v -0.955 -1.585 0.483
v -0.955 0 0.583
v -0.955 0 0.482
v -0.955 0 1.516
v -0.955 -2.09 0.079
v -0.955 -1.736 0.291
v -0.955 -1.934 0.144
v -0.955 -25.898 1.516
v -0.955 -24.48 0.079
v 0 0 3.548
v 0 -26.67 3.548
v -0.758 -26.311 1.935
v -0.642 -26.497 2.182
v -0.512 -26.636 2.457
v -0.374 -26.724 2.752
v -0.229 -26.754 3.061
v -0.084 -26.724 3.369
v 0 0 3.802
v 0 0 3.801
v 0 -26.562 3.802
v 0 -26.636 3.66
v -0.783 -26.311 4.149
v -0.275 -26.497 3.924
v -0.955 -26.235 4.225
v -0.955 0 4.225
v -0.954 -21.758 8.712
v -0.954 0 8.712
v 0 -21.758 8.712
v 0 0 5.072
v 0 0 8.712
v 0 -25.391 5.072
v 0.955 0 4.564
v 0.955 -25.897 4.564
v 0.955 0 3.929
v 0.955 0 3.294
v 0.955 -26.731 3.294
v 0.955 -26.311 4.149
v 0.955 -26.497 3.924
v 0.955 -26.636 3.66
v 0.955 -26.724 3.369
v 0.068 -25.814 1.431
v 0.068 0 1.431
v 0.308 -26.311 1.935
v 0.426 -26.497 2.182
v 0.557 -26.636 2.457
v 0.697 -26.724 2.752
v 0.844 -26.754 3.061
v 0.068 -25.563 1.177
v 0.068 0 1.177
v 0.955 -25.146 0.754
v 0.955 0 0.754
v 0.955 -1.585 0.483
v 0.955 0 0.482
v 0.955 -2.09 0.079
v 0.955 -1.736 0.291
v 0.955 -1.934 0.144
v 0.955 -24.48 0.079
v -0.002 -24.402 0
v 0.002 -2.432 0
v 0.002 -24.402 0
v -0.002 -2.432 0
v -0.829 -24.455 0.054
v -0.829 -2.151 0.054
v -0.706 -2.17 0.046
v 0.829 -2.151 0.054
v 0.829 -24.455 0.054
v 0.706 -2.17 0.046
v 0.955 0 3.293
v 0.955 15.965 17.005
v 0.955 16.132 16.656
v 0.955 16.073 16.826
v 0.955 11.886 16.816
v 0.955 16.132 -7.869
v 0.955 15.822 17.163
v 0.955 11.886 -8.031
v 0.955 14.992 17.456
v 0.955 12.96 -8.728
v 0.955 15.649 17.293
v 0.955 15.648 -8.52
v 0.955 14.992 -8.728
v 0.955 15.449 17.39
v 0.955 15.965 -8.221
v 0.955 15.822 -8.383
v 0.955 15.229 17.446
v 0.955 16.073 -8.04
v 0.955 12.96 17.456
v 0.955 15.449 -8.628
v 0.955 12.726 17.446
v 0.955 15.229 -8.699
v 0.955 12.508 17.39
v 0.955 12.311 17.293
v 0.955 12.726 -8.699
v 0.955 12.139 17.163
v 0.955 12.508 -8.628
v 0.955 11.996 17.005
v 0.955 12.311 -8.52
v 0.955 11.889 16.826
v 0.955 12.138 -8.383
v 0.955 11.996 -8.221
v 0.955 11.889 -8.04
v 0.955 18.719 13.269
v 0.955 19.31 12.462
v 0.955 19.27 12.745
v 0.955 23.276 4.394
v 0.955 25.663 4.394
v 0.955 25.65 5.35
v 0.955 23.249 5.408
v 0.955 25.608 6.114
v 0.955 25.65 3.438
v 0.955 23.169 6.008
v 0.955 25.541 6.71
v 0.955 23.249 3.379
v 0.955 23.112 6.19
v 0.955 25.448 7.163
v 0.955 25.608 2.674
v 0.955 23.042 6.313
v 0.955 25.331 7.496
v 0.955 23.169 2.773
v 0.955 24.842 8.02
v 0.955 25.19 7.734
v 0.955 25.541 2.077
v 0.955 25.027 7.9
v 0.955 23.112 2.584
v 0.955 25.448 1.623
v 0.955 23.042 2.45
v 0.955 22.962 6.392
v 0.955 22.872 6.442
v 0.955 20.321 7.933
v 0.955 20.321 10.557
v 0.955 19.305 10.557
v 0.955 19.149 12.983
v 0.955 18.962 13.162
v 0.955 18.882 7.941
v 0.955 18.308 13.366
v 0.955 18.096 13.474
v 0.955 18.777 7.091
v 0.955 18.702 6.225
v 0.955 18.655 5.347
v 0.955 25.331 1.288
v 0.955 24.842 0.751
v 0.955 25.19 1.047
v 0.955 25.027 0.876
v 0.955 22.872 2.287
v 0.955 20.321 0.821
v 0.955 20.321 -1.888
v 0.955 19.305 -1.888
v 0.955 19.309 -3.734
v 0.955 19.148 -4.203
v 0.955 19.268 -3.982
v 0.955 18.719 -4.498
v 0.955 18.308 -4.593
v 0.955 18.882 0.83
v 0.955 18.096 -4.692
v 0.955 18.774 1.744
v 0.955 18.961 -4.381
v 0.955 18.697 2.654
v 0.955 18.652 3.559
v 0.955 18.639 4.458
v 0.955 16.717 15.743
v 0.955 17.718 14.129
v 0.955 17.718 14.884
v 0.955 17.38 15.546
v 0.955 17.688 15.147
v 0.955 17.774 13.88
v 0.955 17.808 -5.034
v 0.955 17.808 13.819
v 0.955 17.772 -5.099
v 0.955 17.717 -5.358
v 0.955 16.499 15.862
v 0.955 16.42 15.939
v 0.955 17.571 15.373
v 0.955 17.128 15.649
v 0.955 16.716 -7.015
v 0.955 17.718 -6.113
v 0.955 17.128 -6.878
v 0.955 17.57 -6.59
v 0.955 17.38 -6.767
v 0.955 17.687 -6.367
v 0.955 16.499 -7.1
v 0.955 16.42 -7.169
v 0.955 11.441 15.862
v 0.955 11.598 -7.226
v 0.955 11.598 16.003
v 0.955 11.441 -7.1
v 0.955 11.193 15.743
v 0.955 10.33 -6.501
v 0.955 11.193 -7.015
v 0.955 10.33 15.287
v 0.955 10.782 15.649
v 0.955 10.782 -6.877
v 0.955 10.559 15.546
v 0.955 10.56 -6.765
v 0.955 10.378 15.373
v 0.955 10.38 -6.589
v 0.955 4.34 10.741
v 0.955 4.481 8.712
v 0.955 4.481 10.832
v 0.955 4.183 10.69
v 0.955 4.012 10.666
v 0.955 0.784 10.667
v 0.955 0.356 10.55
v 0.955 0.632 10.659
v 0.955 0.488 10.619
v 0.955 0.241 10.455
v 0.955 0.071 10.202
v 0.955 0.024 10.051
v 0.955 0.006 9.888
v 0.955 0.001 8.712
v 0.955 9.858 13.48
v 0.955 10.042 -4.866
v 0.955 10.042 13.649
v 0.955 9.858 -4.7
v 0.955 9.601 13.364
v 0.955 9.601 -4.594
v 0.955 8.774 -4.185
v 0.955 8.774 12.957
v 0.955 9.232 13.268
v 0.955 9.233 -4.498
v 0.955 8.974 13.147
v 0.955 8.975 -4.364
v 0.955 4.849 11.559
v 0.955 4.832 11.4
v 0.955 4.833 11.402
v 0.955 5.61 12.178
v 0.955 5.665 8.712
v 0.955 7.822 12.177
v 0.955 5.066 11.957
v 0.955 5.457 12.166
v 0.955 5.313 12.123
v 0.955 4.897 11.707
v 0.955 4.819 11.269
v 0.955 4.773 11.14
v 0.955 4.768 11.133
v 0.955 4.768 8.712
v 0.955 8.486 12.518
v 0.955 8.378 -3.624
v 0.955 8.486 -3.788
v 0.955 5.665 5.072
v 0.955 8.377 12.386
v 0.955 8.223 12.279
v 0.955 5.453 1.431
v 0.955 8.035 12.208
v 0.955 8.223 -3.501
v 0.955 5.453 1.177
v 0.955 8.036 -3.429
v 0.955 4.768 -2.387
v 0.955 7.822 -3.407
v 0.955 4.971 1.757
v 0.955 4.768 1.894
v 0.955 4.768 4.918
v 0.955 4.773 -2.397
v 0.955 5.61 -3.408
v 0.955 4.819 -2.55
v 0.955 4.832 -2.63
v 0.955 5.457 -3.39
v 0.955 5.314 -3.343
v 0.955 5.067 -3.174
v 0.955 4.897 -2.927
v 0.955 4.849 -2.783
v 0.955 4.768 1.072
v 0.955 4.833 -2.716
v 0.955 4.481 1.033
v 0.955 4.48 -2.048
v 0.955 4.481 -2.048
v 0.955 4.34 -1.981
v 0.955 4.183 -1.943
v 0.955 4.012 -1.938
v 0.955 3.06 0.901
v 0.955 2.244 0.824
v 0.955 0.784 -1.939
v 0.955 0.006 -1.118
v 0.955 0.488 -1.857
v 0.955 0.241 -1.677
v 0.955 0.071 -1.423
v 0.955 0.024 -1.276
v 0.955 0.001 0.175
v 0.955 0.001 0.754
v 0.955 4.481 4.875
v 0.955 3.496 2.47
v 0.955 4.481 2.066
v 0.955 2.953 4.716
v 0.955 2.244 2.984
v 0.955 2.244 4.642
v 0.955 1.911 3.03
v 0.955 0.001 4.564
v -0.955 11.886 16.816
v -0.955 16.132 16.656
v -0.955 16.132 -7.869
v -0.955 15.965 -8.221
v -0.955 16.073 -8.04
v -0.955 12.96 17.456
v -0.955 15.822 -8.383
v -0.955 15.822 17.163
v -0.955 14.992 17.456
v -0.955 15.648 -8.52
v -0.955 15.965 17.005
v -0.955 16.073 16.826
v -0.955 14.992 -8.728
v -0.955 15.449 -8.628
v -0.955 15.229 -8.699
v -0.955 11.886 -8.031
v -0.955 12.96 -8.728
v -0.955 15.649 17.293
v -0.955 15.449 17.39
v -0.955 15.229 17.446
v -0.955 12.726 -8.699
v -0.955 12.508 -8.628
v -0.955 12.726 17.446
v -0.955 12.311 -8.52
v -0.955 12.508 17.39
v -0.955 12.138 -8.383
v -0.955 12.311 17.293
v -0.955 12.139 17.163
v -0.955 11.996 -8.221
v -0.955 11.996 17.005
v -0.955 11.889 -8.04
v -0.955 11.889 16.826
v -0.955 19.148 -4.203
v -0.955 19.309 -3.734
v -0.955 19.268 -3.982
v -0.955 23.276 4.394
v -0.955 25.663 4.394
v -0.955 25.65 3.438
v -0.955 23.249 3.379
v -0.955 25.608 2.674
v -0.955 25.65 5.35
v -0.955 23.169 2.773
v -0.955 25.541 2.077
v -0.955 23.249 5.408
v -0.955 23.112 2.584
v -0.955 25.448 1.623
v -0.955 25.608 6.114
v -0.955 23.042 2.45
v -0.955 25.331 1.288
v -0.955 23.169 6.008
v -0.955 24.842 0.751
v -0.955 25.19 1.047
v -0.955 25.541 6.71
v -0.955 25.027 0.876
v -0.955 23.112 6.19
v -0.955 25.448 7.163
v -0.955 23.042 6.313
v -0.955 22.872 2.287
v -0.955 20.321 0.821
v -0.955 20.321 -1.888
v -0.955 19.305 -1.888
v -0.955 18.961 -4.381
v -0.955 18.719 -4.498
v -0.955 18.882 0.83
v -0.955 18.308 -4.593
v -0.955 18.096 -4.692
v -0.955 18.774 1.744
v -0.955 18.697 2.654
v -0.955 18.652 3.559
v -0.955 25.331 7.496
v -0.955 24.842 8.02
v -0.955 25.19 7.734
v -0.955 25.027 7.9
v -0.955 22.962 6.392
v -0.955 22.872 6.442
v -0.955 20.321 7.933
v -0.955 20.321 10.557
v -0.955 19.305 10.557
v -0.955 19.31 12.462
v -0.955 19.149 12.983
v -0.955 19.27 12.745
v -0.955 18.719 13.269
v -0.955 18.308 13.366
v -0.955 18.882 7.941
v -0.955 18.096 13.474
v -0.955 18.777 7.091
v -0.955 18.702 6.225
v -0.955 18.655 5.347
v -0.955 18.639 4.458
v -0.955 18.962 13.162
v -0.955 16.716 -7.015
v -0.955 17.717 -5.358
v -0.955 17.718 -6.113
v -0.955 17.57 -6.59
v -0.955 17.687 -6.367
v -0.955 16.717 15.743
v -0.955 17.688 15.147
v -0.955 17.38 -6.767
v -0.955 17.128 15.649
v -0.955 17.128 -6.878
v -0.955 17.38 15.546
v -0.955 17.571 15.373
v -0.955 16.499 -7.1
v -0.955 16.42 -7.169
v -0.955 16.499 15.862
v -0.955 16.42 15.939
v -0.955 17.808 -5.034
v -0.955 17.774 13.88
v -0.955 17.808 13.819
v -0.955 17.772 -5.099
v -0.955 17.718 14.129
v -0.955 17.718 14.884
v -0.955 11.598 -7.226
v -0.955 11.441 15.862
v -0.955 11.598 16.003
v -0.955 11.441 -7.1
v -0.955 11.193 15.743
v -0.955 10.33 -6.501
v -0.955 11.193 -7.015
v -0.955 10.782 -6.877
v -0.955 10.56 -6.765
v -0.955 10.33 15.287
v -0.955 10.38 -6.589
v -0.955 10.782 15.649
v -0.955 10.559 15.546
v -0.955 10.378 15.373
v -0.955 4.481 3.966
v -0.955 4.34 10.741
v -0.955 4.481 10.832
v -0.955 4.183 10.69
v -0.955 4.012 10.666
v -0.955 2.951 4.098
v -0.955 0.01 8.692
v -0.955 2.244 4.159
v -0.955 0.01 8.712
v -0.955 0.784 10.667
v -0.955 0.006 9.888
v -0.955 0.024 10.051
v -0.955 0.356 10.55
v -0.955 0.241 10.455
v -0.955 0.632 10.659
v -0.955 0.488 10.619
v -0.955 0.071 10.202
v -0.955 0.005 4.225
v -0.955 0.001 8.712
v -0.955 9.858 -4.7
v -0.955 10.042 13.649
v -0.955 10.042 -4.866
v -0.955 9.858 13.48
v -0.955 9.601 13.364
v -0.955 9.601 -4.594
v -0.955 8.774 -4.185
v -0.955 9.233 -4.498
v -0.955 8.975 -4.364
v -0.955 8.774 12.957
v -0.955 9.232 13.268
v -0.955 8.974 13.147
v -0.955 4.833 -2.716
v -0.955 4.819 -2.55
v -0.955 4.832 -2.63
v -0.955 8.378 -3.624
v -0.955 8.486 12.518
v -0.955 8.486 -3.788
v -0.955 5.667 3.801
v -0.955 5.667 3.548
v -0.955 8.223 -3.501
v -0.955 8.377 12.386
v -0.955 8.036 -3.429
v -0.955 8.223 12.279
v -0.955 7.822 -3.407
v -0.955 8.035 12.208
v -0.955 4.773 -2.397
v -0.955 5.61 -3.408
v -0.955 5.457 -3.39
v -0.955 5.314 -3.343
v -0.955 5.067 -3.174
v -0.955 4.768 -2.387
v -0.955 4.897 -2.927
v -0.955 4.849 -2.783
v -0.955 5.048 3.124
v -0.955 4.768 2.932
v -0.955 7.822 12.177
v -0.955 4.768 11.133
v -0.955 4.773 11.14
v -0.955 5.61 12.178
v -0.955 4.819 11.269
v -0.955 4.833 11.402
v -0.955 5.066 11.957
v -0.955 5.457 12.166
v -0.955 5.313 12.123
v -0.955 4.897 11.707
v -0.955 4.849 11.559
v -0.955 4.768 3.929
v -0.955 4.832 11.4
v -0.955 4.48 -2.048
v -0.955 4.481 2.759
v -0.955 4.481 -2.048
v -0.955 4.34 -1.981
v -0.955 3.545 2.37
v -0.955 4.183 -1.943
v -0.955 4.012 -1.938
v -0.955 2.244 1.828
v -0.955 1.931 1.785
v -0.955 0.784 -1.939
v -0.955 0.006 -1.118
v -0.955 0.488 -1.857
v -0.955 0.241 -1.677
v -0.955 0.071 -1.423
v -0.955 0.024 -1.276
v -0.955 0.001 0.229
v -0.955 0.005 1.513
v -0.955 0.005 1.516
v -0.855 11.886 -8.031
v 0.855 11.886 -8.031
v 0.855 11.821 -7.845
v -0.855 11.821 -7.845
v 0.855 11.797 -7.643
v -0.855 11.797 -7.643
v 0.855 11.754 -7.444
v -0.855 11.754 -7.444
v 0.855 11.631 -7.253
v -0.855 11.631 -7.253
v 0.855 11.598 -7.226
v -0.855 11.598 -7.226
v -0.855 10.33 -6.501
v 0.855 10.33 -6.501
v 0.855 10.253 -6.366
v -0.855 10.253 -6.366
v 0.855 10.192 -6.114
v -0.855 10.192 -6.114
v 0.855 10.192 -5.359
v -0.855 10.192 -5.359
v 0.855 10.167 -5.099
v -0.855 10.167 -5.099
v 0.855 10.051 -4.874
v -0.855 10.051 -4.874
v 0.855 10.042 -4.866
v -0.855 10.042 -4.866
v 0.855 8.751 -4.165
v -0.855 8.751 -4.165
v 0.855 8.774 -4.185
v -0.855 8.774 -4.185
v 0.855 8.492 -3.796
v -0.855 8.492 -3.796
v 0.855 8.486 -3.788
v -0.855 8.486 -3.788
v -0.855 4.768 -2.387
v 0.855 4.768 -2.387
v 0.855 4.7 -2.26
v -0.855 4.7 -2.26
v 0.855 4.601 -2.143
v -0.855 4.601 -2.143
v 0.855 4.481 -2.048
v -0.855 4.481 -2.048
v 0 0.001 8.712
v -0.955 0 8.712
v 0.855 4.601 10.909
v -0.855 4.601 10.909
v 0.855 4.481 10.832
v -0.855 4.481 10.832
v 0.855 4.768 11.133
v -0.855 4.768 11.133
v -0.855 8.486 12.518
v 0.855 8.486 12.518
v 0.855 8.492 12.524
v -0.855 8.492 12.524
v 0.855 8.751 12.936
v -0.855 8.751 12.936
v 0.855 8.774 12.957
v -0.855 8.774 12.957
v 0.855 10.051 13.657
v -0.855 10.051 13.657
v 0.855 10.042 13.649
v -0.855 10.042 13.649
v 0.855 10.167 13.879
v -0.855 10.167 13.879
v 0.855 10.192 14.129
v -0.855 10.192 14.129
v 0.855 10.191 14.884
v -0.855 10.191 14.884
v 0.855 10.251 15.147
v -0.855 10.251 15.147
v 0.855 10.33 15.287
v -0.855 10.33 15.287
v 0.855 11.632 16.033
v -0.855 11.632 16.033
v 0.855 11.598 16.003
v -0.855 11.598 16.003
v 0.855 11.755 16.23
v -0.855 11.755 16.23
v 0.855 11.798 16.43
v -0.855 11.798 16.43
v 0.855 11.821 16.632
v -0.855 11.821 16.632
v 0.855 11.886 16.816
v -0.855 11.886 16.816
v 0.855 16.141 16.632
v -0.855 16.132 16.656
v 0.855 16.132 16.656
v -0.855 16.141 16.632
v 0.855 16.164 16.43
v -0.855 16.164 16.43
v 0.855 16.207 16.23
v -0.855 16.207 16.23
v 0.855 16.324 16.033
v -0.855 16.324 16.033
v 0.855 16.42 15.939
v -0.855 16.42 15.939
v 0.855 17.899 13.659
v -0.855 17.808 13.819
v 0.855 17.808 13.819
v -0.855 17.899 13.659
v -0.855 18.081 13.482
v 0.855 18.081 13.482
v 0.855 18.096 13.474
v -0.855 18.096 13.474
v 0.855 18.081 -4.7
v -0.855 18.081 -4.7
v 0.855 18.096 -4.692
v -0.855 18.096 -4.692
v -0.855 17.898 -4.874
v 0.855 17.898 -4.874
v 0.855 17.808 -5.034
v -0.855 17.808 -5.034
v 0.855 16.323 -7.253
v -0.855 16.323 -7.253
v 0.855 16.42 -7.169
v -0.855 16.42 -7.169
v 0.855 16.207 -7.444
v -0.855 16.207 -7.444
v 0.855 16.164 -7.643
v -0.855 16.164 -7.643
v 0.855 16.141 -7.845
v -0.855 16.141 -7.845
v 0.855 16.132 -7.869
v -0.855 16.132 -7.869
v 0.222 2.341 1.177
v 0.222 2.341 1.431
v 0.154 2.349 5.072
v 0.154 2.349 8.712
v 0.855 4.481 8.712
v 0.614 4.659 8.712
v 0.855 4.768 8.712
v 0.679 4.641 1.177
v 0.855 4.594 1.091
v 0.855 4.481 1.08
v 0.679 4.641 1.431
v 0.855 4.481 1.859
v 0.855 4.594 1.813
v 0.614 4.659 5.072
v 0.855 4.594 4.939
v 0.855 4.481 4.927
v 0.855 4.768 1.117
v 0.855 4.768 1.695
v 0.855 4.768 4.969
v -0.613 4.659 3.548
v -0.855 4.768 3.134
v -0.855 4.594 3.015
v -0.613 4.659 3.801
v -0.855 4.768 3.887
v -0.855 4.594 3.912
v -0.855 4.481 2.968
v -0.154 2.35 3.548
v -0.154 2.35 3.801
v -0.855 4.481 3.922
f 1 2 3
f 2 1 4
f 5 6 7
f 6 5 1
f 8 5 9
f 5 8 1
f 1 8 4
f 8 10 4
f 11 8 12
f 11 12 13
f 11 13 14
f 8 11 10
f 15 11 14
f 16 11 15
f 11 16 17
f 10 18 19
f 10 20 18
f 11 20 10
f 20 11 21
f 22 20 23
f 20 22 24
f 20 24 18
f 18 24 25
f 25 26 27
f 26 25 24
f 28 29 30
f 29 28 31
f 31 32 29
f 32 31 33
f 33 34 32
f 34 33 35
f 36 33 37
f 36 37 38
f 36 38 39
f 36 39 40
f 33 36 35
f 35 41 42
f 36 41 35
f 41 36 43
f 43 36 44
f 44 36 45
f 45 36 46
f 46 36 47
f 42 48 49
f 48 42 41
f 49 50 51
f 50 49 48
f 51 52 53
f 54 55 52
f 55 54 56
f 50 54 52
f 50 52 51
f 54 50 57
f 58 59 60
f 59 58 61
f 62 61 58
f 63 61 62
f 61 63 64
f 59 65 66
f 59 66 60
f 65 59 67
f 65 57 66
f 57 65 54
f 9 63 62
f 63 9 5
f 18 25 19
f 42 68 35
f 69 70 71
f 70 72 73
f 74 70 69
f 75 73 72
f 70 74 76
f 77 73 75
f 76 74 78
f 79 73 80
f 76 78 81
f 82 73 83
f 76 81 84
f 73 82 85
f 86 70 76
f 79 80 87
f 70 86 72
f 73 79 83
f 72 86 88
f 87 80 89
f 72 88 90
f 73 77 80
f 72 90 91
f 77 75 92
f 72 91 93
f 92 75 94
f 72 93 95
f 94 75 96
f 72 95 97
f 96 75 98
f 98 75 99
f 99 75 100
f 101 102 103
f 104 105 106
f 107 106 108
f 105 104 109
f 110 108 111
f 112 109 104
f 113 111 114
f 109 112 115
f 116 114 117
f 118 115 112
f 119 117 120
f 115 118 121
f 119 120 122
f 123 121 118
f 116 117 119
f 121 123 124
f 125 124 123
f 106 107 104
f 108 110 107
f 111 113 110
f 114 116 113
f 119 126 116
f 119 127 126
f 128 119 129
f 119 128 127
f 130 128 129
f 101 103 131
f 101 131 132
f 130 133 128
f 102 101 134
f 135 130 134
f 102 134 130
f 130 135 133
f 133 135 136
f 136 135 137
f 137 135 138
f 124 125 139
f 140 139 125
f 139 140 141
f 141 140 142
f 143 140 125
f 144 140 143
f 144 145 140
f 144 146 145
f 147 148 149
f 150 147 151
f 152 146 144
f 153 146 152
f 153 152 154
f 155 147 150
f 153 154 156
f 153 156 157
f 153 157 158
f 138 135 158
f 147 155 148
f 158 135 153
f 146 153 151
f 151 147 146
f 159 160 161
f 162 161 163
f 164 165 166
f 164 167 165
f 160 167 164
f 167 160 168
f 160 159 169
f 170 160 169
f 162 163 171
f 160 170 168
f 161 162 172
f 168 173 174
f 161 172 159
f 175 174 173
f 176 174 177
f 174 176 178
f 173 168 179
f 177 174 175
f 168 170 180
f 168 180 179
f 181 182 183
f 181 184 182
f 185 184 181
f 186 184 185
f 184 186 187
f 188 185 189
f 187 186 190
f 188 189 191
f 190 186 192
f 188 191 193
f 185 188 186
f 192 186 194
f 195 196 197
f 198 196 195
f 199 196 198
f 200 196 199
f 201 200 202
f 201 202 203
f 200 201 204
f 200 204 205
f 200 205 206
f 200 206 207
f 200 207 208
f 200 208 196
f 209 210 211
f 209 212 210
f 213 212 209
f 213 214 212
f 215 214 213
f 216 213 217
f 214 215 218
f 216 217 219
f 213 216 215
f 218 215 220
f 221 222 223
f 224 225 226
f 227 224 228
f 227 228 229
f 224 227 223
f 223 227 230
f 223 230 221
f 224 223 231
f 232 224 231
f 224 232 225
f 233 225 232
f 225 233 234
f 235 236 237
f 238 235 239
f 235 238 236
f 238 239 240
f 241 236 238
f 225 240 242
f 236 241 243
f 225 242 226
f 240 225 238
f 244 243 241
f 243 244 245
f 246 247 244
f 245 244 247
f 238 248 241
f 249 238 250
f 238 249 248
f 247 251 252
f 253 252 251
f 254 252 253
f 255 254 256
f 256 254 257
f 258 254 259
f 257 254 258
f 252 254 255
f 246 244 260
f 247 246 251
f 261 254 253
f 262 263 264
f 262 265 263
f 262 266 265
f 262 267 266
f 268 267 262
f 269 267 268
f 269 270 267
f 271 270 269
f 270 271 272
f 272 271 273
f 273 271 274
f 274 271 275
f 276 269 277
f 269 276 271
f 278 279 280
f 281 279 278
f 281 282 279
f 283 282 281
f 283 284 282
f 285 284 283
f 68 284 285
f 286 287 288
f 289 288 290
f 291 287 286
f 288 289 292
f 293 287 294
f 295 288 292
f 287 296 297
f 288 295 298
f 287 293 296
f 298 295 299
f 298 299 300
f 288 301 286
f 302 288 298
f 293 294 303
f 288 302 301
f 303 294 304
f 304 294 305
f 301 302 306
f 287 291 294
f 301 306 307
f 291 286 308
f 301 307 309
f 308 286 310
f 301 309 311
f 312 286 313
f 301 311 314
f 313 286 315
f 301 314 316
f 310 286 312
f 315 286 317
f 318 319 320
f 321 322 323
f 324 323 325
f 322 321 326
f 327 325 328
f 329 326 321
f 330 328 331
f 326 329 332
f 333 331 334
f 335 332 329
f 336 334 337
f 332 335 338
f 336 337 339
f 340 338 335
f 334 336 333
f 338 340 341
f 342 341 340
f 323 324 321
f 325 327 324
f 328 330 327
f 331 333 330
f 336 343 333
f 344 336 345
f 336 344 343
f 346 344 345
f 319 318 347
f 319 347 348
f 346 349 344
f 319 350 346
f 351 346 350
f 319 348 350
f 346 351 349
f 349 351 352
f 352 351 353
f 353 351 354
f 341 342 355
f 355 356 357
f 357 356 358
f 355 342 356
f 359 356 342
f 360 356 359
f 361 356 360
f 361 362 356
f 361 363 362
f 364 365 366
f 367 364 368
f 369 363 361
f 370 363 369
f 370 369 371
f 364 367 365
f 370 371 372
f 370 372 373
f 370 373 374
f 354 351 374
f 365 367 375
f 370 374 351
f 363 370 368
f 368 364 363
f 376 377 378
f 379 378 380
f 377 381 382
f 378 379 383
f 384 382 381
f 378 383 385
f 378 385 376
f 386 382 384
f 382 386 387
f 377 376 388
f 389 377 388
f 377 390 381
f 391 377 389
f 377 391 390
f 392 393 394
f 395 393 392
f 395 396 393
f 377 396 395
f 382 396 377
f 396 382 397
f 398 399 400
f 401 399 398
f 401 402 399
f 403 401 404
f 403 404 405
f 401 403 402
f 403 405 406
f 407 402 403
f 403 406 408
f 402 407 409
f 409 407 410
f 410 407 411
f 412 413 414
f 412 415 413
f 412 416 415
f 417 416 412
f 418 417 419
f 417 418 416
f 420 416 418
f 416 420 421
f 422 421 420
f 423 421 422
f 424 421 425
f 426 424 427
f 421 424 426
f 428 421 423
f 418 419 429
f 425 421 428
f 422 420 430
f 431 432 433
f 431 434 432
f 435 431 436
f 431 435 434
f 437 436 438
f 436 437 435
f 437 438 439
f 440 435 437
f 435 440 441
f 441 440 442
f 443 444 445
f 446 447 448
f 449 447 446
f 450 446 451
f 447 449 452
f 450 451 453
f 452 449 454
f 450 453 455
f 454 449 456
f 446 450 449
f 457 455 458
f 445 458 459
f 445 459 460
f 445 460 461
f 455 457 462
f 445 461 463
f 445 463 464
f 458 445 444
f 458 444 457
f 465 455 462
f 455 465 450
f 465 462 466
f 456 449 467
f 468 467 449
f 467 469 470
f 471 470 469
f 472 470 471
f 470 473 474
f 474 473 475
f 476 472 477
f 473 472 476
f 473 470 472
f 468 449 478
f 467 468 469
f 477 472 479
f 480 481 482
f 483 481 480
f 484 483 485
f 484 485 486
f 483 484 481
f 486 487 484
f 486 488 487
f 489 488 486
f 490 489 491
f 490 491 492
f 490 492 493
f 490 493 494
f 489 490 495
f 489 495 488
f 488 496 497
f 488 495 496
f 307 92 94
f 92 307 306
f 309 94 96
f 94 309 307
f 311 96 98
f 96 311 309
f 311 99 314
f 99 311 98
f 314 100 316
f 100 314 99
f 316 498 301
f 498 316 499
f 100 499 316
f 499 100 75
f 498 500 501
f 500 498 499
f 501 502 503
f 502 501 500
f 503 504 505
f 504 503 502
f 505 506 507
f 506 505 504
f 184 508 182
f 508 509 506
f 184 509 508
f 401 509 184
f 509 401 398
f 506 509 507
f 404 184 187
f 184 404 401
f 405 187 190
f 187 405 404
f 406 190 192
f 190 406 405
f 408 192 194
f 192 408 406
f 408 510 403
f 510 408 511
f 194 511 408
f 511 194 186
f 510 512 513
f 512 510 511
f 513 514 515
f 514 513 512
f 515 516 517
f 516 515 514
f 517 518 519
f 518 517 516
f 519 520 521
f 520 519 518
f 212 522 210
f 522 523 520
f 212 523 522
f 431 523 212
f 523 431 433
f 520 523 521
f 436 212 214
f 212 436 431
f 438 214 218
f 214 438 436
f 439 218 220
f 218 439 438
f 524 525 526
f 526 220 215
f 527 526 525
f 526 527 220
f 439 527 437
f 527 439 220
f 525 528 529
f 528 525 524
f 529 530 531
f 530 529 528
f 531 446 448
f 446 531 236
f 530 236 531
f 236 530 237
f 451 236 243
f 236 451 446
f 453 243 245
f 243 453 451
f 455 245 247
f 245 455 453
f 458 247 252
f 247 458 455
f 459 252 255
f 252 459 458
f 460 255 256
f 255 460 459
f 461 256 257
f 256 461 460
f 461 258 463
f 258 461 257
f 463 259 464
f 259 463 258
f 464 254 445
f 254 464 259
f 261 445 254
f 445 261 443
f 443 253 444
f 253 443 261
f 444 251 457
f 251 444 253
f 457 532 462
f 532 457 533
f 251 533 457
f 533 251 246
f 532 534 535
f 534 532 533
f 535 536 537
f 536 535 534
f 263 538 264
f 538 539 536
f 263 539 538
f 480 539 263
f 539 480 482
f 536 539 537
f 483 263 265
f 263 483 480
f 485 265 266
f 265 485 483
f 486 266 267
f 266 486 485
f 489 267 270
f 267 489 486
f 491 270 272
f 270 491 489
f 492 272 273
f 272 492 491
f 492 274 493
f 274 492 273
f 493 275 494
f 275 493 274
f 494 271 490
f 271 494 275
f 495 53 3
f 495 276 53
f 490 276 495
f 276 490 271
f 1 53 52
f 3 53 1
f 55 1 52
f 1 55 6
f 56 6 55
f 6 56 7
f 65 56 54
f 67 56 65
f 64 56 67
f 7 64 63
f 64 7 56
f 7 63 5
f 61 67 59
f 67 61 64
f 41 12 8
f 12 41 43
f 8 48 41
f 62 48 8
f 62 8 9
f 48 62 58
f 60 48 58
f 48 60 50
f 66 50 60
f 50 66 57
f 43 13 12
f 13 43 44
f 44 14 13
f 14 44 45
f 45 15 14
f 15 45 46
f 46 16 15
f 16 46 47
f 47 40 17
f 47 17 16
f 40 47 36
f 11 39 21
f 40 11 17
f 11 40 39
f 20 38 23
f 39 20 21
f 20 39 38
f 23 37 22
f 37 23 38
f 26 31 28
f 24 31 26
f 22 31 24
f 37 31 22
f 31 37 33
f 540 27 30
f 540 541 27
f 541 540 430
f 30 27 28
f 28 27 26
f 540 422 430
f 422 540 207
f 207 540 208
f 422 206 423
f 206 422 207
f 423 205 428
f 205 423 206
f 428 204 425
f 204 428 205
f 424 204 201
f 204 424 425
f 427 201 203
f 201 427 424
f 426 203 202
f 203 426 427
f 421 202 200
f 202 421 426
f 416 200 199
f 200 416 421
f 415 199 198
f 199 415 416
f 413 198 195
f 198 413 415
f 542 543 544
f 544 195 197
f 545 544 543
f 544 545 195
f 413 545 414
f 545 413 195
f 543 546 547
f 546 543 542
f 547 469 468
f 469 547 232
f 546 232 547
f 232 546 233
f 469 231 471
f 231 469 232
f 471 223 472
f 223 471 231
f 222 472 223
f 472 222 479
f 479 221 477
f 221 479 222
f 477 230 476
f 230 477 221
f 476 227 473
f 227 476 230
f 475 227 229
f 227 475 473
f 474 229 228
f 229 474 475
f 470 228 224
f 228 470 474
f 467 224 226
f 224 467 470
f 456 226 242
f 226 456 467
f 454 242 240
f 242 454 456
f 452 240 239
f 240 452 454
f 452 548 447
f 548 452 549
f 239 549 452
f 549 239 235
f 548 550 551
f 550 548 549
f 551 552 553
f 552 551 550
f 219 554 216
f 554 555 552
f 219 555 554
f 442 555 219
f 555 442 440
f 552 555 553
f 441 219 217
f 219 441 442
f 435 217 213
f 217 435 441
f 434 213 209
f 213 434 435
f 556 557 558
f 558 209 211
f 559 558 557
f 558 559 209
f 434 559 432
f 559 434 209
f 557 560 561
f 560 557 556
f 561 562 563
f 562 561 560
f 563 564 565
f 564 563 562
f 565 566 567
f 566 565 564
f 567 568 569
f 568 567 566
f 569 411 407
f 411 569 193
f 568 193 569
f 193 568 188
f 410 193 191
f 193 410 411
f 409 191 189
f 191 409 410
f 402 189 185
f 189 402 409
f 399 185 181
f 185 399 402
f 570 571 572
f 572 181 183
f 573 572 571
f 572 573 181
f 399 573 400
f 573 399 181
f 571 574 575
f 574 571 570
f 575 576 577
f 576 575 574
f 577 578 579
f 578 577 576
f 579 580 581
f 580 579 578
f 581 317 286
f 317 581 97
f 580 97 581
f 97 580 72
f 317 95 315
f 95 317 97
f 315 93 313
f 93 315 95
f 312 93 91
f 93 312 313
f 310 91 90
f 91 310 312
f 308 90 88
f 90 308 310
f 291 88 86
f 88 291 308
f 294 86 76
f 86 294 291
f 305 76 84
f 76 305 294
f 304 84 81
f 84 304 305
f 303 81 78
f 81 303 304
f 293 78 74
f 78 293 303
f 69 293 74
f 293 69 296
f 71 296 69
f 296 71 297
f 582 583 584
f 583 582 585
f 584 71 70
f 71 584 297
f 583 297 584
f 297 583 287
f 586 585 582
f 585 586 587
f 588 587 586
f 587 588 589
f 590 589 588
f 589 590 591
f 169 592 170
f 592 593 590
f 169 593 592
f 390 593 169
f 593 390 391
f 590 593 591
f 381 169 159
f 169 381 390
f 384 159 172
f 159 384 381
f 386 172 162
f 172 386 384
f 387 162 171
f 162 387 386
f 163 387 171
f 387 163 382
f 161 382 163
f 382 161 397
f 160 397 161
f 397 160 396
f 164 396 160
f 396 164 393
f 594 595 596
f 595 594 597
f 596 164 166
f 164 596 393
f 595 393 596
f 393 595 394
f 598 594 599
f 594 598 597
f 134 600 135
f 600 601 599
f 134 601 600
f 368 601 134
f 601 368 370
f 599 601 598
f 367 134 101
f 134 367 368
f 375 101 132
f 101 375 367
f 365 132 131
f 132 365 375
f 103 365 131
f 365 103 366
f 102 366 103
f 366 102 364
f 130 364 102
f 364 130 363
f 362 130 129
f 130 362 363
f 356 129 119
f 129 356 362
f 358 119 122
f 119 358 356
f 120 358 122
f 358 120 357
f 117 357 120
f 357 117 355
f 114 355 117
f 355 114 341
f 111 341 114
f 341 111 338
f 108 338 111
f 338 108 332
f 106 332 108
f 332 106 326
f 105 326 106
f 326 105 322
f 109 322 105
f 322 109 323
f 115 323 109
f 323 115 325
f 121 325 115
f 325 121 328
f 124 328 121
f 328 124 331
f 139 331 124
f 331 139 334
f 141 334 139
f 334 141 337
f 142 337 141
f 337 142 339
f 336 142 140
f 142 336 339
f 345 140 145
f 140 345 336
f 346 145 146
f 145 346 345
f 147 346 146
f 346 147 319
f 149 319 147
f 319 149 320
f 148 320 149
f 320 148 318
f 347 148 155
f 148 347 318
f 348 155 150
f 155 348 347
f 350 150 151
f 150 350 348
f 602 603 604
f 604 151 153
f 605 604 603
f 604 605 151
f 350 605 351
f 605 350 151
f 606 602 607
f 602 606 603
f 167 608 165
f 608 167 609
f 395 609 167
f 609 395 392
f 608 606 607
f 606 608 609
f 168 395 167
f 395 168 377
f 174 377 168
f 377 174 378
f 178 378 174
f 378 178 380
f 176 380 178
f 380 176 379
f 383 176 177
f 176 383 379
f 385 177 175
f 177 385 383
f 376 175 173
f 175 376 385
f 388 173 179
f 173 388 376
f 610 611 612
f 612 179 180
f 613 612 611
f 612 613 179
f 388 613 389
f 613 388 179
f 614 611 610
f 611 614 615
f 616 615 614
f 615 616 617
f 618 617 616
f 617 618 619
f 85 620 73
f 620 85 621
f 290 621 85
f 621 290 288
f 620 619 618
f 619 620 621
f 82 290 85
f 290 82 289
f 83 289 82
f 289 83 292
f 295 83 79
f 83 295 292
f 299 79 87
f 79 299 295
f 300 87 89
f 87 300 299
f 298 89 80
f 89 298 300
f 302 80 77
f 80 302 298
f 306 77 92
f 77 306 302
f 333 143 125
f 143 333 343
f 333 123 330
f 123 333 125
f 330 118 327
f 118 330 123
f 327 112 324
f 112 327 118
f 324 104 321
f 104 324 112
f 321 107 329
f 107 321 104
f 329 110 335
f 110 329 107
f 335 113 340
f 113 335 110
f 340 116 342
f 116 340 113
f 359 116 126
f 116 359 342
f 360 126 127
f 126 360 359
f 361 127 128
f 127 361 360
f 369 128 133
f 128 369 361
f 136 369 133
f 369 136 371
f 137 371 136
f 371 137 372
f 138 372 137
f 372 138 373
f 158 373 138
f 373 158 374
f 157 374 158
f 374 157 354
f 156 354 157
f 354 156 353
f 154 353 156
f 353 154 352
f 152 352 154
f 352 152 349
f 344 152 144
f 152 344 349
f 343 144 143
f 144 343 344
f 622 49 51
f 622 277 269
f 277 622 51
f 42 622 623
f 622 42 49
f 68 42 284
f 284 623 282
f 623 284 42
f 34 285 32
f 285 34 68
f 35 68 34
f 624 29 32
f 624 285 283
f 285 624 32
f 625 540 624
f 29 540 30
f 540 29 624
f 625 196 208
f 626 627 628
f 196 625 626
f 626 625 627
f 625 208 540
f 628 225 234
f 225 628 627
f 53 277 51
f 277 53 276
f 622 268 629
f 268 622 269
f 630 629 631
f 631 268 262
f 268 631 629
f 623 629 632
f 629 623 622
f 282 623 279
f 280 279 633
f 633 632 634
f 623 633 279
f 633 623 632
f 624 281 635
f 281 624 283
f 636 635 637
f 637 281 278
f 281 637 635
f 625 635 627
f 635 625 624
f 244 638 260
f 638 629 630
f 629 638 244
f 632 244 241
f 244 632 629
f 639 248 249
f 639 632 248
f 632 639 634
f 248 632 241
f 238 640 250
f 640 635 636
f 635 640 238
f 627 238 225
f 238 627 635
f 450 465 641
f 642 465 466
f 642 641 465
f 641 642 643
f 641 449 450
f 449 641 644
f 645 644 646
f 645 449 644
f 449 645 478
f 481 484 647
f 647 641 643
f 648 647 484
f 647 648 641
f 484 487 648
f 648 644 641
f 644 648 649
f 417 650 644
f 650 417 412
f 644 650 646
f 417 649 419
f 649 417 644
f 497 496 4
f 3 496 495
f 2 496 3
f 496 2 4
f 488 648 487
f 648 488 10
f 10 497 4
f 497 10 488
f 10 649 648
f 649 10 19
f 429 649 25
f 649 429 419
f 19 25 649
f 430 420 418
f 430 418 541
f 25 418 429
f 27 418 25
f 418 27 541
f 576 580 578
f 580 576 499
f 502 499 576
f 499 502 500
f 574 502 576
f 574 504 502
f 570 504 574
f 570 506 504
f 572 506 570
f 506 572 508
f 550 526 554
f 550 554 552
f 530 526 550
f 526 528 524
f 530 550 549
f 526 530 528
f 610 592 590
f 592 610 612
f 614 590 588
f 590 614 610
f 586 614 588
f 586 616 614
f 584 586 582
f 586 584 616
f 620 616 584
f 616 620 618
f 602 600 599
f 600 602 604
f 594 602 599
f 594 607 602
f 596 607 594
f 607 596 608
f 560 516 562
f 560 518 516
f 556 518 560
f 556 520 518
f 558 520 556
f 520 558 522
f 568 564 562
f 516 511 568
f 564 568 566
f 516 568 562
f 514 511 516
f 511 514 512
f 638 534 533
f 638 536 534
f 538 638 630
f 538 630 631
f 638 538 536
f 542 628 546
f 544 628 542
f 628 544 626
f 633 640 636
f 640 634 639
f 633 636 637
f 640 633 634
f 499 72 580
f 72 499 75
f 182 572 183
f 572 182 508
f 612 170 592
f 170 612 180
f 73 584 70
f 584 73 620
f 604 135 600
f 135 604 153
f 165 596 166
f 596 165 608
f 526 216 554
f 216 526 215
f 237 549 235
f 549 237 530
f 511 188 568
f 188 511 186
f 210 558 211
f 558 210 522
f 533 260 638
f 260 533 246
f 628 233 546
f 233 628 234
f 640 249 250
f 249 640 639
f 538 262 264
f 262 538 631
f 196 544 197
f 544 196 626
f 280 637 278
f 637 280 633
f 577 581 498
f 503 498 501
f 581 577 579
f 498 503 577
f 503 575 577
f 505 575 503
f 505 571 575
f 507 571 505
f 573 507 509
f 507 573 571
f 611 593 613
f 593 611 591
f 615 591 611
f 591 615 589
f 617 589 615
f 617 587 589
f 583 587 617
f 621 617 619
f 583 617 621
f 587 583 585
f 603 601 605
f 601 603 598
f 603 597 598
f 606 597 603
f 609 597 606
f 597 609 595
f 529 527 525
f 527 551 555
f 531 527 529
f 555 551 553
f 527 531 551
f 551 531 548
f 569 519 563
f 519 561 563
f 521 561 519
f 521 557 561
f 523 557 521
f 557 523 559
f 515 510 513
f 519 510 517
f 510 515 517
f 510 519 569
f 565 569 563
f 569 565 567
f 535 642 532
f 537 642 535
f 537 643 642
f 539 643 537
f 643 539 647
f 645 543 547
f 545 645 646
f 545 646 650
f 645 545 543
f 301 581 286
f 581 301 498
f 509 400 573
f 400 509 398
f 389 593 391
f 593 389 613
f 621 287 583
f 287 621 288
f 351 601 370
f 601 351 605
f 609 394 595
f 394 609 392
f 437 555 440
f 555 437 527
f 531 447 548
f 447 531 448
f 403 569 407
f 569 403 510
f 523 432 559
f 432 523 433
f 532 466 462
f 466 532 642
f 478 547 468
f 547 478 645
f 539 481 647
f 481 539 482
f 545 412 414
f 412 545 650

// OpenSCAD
// file: keygen.scad
$inf=1000;
$eps=.001;

function key_move(points, offset) = [
    for(p=points) [p[0] + offset[0],
                   p[1] + offset[1]]
];

module key_outline(outline_points, thickness, outline_paths=undef) {
    rotate(-90, [0, 1, 0]) rotate(-90, [0, 0, 1]) // Rotate into the correct plane
        linear_extrude(height=thickness, center=true) // Extrude the key outline
            polygon(points=outline_points, paths=outline_paths); // Draw the outline
}

module key_blade(warding, plug_diameter=0) {
    // Draw the blade to infinity in Y
    // optionally intersected with the plug cylinder
    // to round the bottom
    intersection() {
        rotate(180, [0, 0, 1]) rotate(90, [1, 0, 0])
            linear_extrude(height=2*$inf, center=true)
                polygon(warding);

        // Draw the plug, if a plug diameter is specified
        if(plug_diameter > 0) {
            // Draw infinite cylinder in -Y
            translate([0, 0, 0.5*plug_diameter]) rotate(90, [1, 0, 0])
                cylinder(r=0.5*plug_diameter, h=$inf, center=true, $fn=$fn ? 4*$fn : 48);
        }
    }
}

module key_x_line(length) {
    // Hack to draw something close to a line in X
    // since OpenSCAD does not support line primitives
    square([length, $eps], center=true);
}

module key_warding_cutter(warding, blade_height, cutter_radius, left) {
    neg = left ? -1 : 1;
    translate([neg * cutter_radius, 0, 0])
        rotate_extrude($fn=$fn ? 4*$fn : 48)
            translate([neg * cutter_radius, 0])
                difference() {
                    translate([0, 0.5*blade_height])
                        square([2 * cutter_radius, blade_height], center=true);
                    minkowski() {
                        translate([neg * 1.5 * cutter_radius, 0])
                            key_x_line(3 * cutter_radius);
                        polygon(warding);
                    }
                    polygon(warding);
                }
}

module key_engrave(engrave_points, engrave_depth, left, thickness, engrave_paths=undef) {
    translate([(left ? -1 : 1) * 0.5*thickness, 0, 0]) rotate(-90, [0, 1, 0]) rotate(-90, [0, 0, 1]) // Translate and rotate into the correct soot
        linear_extrude(height=2*engrave_depth, center=true) // Extrude the key outline
            polygon(points=engrave_points, paths=engrave_paths); // Draw the outline
}

module key_blank(outline_points,
                warding,
                outline_paths=undef,
                engrave_right_points=[],
                engrave_right_paths=undef,
                engrave_left_points=[],
                engrave_left_paths=undef,
                bow_thickness=0,
                engrave_depth=.1,
                plug_diameter=0,
                offset=[0, 0],
                cutter_radius=18,
                milling_offset=0) {

    // Find the bounding box of the warding
    warding_min = [min([for(e=warding) e[0]]), min([for(e=warding) e[1]])];
    warding_max = [max([for(e=warding) e[0]]), max([for(e=warding) e[1]])];

    // Apply the given offset to the outline,
    // holes, and engrave
    outline_adj = key_move(outline_points, offset);
    engrave_left_adj = key_move(engrave_left_points, offset);
    engrave_right_adj = key_move(engrave_right_points, offset);

    // Move the warding profile
    // so that it is centered in X
    // and non-negative in Y
    warding_offset = [-0.5 * (warding_min[0] + warding_max[0]),
                      -warding_min[1]];
    warding_adj = key_move(warding, warding_offset);

    // Infer various key properties
    thickness = (bow_thickness == 0) ? abs(warding_max[0] - warding_min[0]) : bow_thickness;
    blade_height = abs(warding_max[1] - warding_min[1]);

    // Cut out the warding milling artifacts
    // from the bow
    difference() {
        // Create the bulk of the keyblank
        // by intersecting the outline
        // with the warding profile
        // and the plug
        intersection() {
            // Draw the key outline and holes
            key_outline(outline_adj, thickness, outline_paths);
            
            // Draw the blade, and a giant box where the bow is
            // so that we don't wipe out the bow
            // when the intersection happens
            union() {
                // Fill +Y half-space
                translate([0, $inf/2+milling_offset, 0])
                    cube([$inf, $inf, $inf], center=true);

                key_blade(warding_adj, plug_diameter);
            }
        }
        // Draw the milling wheels that cut the warding
        if(cutter_radius != 0) {
            translate([0, milling_offset, 0])
                union() {
                    key_warding_cutter(warding_adj, blade_height, cutter_radius, false);
                    key_warding_cutter(warding_adj, blade_height, cutter_radius, true);
                }
        }

        // Draw the engraveing
        key_engrave(engrave_right_adj, engrave_depth, false, thickness, engrave_right_paths);
        key_engrave(engrave_left_adj, engrave_depth, true, thickness, engrave_left_paths);
    }
}

function key_code_to_heights(code, depth_table) = [for(i=key_enum(code)) depth_table[search(code[i], "0123456789")[0]]];

module key_bitting_cutter(flat, angle, tool_height) {
    polygon([[-0.5 * flat, 0],
            [0.5 * flat, 0],
            [0.5 * flat + tan(0.5 * angle) * tool_height, tool_height],
            [-0.5 * flat - tan(0.5 * angle) * tool_height, tool_height]]);
}

module key_bitting(heights,
                   locations,
                   flat,
                   angle=100,
                   cutter_width=5,
                   cutter_height=5,
                   angles=[]) {
    // Rotate the cutting tool to the proper orientation
    rotate(-90, [0, 0, 1]) rotate(90, [1, 0, 0])
        // Union together a handful of trapezoids
        // that comprise the cuts
        union() {
            for(i=key_enum(heights)) {
                // Move to the proper location and height, and maybe rotate
                translate([locations[i], heights[i]]) rotate(i >= len(angles) ? 0 : angles[i], [0, 1, 0])
                    linear_extrude(height=cutter_width, center=true)
                        key_bitting_cutter(flat, angle, cutter_height);
            }
        }
}

module m3_slider(slider_depth) {
        // Creates a cuboid cut in the finished Medeco M3 key blank for the M3 slider element
        difference()  {
            translate([-1.4445,-slider_depth-30,0])
                cube([1,30,2.6]); //measurements of slider dimensions taken from a couple M3 keys. M3 slider depths appear to be in 0.1" increments (from 0.3" - 0.7" possibly?)
    }
	
}

function key_lkup(ks, vs, k) = vs[search([k], [for(ki=ks) [ki]])[0]];
    
function key_enum(l) = len(l) > 0 ? [for(i=[0:len(l)-1]) i] : [];

function _strcat(v, i, car, s) = (i==s ? v[i] : str(_strcat(v, i-1, car, s), str(car,v[i]) )); // from https://www.thingiverse.com/thing:202724

function _strslice(l, start, stop) =
        stop > start
        ? _strcat([for(i=[start:stop]) l[i]], stop-start, "", 0)
        : "";

function key_split_on_dash(s) = [
    for(i=[0:len(search("-", s, 0)[0])])
        _strslice(s, search("-", str("-", s), 0)[0][i], search("-", str(s, "-"), 0)[0][i]-1)
];
// main file
use <keygen.scad>
include <gen/schlage.gen.scad>

module schlage_classic(bitting="",
                       outline_name="5-pin",
                       warding_name="C") {

    name = "Schlage Classic";

    /*
        Bitting is specified from bow to tip, 0-9, with 0 being the shallowest cut and 9 being the deepest.
        Example: 25363
    */

    outlines_k = ["5-pin",
                  "6-pin"];
    outlines_v = [[outline_5pin_points, outline_5pin_paths,
                   [-outline_5pin_points[92][0], -outline_5pin_points[98][1]],
                   engrave_5pin_points,
                   engrave_5pin_paths],
                  [outline_6pin_points, outline_6pin_paths,
                   [-outline_6pin_points[92][0], -outline_6pin_points[98][1]],
                   engrave_6pin_points,
                   engrave_6pin_paths]];
    wardings_k = ["C",
                  "CE",
                  "E",
                  "EF",
                  "F",
                  "FG",
                  "H",
                  "J",
                  "K",
                  "L"];
    wardings_v = [warding_c_points,
                  warding_ce_points,
                  warding_e_points,
                  warding_ef_points,
                  warding_f_points,
                  warding_fg_points,
                  warding_h_points,
                  warding_j_points,
                  warding_k_points,
                  warding_l_points];

    outline_param = key_lkup(outlines_k, outlines_v, outline_name);
    outline_points = outline_param[0];
    outline_paths = outline_param[1];
    offset = outline_param[2];
    engrave_points = outline_param[3];
    engrave_paths = outline_param[4];

    warding_points = key_lkup(wardings_k, wardings_v, warding_name);
    
    cut_locations = [for(i=[.231, .3872, .5434, .6996, .8558, 1.012]) i*25.4];
    depth_table = [for(i=[0.335:-0.015:0.199]) i*25.4];

    heights = key_code_to_heights(bitting, depth_table);

    difference() {
        if($children == 0) {
            key_blank(outline_points,
                      warding_points,
                      outline_paths=outline_paths,
                      engrave_right_points=engrave_points,
                      engrave_right_paths=engrave_paths,
                      engrave_left_points=engrave_points,
                      engrave_left_paths=engrave_paths,
                      offset=offset,
                      plug_diameter=12.7);
        } else {
            children(0);
        }
        key_bitting(heights, cut_locations, .7874);
    }
}

// Defaults
bitting="";
outline="5-pin";
warding="C";
schlage_classic(bitting, outline, warding);
